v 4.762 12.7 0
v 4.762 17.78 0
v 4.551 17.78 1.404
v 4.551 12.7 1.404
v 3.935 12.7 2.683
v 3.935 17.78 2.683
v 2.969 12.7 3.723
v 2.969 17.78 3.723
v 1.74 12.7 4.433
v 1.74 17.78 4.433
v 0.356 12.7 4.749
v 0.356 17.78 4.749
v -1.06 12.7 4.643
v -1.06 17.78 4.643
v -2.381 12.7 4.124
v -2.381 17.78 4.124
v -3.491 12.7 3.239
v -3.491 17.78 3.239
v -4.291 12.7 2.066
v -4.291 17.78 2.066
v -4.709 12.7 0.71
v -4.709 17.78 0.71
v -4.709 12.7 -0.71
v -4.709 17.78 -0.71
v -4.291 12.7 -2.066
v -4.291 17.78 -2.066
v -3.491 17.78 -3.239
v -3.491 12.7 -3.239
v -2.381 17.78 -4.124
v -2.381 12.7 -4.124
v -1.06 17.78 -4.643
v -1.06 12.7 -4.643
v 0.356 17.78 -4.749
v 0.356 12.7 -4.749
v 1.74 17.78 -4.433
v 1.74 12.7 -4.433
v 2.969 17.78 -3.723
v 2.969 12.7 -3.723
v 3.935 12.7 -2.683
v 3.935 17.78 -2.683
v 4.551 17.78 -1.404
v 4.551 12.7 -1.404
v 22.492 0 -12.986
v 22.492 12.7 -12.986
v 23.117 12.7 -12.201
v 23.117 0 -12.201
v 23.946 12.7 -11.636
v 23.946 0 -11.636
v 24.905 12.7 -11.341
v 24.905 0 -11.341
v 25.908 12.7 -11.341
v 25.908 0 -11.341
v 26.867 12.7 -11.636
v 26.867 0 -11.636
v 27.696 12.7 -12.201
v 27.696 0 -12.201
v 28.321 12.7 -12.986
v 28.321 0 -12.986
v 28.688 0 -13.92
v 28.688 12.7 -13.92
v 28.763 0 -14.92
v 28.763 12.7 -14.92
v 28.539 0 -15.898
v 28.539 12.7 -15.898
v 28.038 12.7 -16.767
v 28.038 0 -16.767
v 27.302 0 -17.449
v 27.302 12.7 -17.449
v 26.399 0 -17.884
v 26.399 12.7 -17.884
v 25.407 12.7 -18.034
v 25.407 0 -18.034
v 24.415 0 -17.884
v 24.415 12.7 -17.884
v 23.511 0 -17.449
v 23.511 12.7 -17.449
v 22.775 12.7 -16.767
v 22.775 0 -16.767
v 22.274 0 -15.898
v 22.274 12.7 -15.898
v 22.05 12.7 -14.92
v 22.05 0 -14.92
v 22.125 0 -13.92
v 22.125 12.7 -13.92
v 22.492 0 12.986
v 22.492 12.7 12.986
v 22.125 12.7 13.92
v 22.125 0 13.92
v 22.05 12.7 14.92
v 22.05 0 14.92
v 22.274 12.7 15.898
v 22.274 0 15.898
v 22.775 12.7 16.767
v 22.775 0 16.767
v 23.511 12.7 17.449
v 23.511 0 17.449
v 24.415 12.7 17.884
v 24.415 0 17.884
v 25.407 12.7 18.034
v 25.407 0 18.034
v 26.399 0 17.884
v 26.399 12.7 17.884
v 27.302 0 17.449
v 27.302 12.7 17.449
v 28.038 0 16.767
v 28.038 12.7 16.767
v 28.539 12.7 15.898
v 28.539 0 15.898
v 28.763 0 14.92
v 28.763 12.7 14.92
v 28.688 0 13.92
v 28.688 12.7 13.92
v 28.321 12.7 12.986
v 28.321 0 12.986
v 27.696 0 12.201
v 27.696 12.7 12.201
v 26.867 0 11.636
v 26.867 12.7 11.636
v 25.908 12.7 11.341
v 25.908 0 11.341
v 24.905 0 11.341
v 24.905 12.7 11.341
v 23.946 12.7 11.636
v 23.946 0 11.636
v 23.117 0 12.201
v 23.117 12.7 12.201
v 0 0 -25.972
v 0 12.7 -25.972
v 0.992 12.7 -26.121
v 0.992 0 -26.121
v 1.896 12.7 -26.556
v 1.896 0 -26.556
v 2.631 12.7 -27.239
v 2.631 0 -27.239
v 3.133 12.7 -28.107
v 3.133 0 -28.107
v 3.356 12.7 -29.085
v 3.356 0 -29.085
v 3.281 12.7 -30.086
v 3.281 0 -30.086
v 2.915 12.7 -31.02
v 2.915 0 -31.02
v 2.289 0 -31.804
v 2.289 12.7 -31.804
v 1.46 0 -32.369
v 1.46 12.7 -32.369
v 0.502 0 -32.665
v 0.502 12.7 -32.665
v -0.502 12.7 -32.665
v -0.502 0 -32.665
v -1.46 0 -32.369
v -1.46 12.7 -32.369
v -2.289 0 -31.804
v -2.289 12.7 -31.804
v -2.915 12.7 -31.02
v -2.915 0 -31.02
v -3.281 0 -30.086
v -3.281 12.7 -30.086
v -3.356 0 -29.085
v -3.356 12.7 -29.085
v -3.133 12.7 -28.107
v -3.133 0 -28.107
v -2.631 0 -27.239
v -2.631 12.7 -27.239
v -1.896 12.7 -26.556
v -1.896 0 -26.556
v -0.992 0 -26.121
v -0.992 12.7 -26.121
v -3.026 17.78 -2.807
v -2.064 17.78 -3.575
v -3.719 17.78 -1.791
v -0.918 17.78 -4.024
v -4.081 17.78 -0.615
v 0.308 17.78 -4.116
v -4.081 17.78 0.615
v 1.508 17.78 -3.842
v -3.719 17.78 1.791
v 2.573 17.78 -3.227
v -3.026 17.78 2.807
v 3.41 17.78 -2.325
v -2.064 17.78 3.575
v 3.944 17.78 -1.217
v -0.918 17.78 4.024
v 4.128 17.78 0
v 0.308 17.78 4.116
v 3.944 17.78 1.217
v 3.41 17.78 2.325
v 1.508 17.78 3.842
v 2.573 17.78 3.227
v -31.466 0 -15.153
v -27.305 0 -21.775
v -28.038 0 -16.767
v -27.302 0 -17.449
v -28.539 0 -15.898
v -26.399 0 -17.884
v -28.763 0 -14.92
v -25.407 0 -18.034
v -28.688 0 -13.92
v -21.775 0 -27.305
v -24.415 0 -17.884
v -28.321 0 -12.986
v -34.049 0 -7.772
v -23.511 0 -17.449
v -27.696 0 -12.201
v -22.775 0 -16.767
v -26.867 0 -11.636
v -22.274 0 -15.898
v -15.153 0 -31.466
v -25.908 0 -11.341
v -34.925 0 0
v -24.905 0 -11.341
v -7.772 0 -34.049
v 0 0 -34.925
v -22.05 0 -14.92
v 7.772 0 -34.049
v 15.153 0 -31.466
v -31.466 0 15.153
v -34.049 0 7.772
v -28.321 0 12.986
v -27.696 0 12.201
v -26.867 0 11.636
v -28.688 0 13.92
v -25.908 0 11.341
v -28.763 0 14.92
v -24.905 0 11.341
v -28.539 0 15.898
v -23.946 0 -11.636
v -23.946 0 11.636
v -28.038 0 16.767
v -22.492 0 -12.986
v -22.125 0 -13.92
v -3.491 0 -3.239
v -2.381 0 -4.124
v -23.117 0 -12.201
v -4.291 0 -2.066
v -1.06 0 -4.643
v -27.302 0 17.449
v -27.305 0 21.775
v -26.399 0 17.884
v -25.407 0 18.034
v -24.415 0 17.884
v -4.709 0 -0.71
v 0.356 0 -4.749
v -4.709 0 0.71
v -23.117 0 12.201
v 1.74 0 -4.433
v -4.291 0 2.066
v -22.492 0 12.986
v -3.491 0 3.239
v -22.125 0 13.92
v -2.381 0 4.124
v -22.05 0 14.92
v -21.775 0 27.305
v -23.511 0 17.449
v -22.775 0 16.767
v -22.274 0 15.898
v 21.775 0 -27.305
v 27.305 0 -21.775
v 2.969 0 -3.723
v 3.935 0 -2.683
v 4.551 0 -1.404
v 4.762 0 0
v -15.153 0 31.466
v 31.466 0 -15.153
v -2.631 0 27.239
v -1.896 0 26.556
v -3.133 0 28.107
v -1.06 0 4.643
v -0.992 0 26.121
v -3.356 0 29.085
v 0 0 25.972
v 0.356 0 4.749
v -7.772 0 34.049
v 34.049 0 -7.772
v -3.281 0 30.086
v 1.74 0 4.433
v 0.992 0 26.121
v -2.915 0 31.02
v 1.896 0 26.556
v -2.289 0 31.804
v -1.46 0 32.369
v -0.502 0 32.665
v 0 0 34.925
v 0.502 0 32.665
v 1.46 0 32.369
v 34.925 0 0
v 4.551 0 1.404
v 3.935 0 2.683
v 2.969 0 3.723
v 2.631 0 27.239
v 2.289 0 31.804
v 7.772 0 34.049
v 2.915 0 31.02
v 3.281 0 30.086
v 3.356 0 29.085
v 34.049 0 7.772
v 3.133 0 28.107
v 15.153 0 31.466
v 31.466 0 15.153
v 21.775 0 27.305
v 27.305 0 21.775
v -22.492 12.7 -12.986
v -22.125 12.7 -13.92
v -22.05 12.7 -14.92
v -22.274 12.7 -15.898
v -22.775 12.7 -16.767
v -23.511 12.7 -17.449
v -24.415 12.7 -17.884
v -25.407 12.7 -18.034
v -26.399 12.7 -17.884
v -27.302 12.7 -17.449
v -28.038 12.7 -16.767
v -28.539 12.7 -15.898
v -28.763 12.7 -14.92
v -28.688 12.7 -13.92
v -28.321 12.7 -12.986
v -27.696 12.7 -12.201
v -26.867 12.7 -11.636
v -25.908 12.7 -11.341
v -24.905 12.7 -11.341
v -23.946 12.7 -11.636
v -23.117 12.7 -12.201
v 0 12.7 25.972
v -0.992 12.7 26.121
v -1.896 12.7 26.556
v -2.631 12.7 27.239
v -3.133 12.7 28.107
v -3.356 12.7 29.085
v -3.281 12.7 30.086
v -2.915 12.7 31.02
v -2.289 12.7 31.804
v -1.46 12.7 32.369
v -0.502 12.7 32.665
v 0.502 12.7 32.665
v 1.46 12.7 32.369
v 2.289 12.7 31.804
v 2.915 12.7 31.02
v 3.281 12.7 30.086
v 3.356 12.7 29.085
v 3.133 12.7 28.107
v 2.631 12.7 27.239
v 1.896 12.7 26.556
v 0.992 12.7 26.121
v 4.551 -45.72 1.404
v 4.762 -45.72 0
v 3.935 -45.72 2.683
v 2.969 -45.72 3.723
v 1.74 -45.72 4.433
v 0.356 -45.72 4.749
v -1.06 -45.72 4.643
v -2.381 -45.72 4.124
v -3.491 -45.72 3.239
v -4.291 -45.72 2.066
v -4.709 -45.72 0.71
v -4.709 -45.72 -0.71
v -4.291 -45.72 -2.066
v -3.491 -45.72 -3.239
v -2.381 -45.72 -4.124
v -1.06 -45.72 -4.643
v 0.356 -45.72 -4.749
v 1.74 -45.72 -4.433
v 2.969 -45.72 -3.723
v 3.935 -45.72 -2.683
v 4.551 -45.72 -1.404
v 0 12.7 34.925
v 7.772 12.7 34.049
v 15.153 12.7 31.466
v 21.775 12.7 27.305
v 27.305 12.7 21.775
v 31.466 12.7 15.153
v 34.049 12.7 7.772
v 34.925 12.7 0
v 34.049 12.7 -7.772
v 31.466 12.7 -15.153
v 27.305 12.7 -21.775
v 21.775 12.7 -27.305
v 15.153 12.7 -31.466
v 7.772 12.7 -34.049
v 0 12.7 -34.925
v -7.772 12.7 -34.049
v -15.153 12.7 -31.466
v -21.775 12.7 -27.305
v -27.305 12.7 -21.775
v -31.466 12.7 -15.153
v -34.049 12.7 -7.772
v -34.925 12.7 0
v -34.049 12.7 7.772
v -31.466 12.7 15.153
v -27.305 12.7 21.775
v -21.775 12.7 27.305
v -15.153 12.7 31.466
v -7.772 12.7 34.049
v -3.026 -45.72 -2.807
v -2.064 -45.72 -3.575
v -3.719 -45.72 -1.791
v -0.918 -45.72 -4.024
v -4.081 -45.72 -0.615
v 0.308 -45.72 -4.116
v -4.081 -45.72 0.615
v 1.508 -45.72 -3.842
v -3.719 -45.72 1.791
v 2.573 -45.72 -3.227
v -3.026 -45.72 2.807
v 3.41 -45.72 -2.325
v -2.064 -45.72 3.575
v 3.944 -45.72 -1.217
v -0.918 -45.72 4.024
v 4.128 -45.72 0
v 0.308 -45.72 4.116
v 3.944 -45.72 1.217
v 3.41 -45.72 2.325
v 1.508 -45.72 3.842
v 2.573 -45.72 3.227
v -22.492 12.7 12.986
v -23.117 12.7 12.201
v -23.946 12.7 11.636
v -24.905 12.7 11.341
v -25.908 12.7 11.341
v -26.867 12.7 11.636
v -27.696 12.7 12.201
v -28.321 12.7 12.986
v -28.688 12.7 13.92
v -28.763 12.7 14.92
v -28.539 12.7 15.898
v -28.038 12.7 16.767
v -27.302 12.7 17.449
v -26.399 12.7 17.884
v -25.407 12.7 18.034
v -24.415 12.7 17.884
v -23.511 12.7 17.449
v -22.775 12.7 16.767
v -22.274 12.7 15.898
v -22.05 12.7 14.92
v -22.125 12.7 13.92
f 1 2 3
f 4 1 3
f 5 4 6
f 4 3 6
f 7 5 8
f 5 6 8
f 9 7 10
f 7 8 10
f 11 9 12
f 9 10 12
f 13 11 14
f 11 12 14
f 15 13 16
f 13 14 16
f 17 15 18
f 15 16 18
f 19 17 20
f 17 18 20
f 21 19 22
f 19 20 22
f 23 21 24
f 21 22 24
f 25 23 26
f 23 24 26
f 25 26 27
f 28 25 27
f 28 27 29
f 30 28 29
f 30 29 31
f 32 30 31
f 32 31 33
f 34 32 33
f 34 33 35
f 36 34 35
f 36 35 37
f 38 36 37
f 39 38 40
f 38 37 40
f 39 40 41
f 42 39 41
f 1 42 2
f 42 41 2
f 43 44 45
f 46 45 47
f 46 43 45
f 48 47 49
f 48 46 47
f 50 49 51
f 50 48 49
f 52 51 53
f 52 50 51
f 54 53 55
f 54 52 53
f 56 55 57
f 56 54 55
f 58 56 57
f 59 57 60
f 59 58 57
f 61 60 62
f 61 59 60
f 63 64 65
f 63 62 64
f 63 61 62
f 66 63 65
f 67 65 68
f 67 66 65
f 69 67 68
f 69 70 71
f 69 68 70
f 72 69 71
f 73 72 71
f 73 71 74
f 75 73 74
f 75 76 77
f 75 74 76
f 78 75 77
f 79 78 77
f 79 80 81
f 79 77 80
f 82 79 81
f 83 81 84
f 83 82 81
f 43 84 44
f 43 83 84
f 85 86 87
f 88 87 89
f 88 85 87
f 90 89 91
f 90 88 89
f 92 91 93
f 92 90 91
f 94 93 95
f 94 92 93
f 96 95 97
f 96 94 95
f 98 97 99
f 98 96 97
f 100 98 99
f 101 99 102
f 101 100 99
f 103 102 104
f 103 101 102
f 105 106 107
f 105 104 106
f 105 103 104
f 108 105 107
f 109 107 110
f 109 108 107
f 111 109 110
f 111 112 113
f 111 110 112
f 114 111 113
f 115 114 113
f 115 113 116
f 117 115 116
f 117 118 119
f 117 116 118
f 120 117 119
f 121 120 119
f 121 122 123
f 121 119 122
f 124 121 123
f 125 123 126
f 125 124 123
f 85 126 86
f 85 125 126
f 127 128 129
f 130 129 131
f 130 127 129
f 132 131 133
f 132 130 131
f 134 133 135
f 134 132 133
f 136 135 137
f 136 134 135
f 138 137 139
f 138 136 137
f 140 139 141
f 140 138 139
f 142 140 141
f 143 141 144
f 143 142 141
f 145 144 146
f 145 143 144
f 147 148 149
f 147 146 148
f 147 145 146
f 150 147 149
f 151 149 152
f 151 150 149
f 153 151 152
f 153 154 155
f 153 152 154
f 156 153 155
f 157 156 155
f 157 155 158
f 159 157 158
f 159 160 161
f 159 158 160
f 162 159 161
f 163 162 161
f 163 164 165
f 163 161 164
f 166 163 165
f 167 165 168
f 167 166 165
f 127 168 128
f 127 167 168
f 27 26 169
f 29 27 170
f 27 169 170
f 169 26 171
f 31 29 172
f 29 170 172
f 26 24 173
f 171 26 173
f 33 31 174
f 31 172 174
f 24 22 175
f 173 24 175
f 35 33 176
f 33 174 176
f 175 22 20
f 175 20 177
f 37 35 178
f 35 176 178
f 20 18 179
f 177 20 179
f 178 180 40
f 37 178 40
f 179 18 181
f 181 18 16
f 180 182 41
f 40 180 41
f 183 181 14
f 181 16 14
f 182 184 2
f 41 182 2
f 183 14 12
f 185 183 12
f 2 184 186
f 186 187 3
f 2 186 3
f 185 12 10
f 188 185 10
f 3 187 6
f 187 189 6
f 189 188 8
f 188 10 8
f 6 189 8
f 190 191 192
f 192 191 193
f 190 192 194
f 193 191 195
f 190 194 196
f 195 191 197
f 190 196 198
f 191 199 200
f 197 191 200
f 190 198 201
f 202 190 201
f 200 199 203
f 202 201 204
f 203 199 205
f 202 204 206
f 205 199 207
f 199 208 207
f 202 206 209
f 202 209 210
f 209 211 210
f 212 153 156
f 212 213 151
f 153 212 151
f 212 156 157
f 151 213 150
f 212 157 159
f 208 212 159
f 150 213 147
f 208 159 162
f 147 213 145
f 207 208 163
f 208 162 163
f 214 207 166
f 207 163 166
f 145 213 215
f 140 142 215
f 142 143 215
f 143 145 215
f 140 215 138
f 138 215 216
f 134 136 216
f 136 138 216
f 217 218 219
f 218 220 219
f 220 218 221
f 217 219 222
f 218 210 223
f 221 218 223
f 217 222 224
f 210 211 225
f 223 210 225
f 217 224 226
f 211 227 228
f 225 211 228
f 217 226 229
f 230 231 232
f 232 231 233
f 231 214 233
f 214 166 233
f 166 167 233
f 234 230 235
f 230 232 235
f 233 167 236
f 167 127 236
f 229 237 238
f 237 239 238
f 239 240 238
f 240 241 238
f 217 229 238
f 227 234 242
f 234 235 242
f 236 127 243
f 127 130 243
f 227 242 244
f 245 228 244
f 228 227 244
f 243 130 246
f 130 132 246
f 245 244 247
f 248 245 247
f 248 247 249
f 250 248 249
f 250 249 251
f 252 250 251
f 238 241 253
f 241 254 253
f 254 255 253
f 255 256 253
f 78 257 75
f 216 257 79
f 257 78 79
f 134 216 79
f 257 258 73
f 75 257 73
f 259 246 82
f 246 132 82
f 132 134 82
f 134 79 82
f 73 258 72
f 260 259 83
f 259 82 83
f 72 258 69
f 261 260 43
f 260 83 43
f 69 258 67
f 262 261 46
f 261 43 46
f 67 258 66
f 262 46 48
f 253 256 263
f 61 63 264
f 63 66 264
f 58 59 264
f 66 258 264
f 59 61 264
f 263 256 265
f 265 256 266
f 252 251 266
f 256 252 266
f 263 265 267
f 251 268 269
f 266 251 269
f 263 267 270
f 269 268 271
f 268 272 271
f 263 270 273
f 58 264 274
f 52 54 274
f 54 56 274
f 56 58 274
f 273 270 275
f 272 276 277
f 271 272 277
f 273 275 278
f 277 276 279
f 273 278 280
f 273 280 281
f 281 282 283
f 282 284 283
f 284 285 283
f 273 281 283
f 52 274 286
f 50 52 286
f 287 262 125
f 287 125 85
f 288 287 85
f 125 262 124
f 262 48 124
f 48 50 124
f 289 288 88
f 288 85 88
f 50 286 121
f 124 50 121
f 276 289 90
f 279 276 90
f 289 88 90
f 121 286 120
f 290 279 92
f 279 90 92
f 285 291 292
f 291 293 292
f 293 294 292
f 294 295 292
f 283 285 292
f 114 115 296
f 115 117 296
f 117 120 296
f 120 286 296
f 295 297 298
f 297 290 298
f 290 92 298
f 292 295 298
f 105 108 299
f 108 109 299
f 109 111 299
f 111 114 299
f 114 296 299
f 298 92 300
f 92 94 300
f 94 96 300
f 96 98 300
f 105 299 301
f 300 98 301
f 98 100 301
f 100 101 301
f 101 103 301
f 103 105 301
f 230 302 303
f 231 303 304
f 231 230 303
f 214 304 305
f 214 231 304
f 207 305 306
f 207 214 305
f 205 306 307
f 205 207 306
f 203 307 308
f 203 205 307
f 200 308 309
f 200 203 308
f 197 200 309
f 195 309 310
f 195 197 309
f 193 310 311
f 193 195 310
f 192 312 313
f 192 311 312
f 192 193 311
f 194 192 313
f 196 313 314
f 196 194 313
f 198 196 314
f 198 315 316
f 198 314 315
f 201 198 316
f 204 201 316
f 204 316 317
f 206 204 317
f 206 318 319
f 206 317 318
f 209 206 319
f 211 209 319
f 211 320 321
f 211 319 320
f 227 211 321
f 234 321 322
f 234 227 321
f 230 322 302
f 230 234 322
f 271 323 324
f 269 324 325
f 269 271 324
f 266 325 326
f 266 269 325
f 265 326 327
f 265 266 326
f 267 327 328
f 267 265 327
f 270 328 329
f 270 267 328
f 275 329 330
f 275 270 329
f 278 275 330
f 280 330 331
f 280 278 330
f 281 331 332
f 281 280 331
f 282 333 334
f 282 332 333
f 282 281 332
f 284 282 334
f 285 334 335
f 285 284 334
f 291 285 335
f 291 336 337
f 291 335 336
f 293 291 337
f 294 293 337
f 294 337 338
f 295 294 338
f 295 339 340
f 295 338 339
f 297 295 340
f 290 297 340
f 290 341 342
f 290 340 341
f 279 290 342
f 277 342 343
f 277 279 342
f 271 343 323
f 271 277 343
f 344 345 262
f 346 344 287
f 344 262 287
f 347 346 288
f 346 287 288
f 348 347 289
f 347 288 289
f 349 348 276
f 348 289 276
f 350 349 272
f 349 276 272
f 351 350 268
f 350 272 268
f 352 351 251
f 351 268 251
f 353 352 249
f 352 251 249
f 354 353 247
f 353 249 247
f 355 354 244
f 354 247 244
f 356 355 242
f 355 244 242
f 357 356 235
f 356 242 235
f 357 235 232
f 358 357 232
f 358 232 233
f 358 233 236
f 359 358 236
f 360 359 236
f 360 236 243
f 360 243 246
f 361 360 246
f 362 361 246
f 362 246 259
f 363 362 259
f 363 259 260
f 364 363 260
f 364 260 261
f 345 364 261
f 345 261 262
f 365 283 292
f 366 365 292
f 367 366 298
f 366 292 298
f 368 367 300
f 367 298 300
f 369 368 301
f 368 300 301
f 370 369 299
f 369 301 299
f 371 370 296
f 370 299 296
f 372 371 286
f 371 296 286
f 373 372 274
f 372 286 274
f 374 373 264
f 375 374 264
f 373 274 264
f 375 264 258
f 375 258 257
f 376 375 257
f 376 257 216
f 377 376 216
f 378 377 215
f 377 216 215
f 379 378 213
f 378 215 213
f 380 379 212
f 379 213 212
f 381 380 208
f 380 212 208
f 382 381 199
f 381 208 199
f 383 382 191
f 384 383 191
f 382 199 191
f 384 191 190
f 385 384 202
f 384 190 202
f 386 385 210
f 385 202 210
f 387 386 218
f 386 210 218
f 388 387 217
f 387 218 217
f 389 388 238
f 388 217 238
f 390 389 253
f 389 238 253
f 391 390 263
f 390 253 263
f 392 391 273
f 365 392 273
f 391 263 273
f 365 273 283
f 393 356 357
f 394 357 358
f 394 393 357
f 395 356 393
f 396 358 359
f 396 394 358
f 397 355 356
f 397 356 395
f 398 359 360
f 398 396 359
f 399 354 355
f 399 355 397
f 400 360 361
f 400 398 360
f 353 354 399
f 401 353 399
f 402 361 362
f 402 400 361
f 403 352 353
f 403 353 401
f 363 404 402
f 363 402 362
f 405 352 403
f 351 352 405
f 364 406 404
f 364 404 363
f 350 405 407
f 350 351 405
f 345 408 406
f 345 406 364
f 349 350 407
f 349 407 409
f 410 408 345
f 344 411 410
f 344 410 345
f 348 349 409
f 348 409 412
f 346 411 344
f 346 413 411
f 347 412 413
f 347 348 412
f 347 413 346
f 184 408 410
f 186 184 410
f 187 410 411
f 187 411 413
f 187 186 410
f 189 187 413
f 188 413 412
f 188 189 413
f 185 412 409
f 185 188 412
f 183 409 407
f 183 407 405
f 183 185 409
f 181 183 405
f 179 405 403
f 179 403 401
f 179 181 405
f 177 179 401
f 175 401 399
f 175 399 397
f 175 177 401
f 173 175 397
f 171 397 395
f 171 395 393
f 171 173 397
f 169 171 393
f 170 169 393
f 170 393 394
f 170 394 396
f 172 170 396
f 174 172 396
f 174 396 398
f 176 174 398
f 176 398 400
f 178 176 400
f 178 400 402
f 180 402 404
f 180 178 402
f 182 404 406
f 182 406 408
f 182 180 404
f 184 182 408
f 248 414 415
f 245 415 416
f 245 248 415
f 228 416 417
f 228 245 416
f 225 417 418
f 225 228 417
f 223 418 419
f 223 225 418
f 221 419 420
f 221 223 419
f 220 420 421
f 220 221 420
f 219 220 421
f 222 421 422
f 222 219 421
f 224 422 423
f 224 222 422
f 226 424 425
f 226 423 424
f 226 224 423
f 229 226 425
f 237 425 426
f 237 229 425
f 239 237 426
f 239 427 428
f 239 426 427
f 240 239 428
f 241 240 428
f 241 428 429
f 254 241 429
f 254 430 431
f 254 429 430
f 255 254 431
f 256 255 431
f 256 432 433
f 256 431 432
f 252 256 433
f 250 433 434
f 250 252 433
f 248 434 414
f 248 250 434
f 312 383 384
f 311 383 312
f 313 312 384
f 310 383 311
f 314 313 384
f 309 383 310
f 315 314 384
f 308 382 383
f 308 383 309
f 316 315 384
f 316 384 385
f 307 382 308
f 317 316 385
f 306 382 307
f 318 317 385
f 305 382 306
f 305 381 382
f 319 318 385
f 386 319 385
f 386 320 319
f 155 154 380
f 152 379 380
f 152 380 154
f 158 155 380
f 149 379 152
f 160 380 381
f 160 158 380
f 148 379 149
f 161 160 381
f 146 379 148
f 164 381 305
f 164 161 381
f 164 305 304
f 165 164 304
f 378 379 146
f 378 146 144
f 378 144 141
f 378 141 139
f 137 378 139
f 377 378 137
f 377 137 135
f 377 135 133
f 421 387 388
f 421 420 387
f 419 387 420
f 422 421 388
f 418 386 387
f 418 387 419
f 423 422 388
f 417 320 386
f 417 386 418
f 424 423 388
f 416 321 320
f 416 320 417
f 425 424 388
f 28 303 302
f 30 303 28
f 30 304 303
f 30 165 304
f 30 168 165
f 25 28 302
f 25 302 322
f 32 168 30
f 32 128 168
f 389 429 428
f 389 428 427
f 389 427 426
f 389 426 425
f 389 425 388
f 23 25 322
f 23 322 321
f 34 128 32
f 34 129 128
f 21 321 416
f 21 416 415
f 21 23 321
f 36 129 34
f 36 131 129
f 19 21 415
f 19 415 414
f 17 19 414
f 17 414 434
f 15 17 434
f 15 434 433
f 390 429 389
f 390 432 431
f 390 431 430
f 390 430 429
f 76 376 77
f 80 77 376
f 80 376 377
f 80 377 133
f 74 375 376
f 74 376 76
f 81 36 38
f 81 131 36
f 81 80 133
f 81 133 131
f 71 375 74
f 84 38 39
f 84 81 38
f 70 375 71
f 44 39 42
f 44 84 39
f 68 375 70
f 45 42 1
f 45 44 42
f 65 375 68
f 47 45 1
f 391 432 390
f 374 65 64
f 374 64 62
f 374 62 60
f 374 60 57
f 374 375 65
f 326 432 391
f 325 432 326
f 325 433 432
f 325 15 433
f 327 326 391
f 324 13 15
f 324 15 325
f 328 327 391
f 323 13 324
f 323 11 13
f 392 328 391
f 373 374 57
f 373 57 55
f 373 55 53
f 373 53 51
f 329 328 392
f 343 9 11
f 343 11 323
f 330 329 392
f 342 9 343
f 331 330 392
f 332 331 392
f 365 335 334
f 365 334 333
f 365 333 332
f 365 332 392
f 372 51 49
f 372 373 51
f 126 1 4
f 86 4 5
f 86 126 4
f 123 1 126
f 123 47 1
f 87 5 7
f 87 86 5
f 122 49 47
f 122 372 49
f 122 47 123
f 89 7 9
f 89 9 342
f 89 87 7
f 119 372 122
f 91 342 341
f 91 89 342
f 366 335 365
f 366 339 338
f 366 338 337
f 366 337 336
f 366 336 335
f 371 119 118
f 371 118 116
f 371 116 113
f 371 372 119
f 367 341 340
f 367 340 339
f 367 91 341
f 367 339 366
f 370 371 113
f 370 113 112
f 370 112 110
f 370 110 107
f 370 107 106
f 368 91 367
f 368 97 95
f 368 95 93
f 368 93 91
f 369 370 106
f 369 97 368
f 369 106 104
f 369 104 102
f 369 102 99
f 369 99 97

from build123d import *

# Parameters (mm, degrees)
SKETCH1_R                = 34.925
EXTRUDE1_DEPTH           = 12.7
SKETCH2_R                = 4.7625
CUT_EXTRUDE1_DEPTH       = 51.998051433
SKETCH3_R                = 3.3655
CUT_EXTRUDE2_DEPTH       = 51.998051433
CIRPATTERN1_COUNT        = 6
EXTRUDE_THIN1_DEPTH      = 45.72
EXTRUDE_THIN1_DEPTH_BACK = 17.78
SKETCH5_R                = 4.7625
SKETCH5_R_2              = 4.1275


with BuildPart() as part:
    # Sketch1 → Extrude1 (new body)
    with BuildSketch(Plane(origin=(0, 0, 0), x_dir=(1, 0, 0), z_dir=(0, 1, 0))):
        Circle(SKETCH1_R)
    extrude(amount=EXTRUDE1_DEPTH)

    # Sketch2 → Cut-Extrude1 (cut, through all)
    with BuildSketch(Plane(origin=(0, 0, 0), x_dir=(1, 0, 0), z_dir=(0, 1, 0))):
        Circle(SKETCH2_R)
    extrude(amount=CUT_EXTRUDE1_DEPTH, mode=Mode.SUBTRACT)

    # Sketch3 → Cut-Extrude2 (cut, through all)
    with BuildSketch(Plane(origin=(0, 0, 0), x_dir=(1, 0, 0), z_dir=(0, 1, 0))):
        with Locations((0, 29.337)):
            Circle(SKETCH3_R)
    cut_extrude2 = extrude(amount=CUT_EXTRUDE2_DEPTH, mode=Mode.SUBTRACT)

    # CirPattern1: Cut-Extrude2 ×6 about axis
    cirpattern1_axis = Axis((0, 35.858162691, 0), (0, -1, 0))
    for i in range(1, CIRPATTERN1_COUNT):
        add(cut_extrude2.rotate(cirpattern1_axis, i * 360 / CIRPATTERN1_COUNT), mode=Mode.SUBTRACT)

    # Sketch5 → Extrude-Thin1 (add, two sides: drawn at the far end of the back side and taken through both)
    with BuildSketch(Plane.XZ.offset(-EXTRUDE_THIN1_DEPTH_BACK)):
        Circle(SKETCH5_R)
        Circle(SKETCH5_R_2, mode=Mode.SUBTRACT)
    extrude(amount=EXTRUDE_THIN1_DEPTH + EXTRUDE_THIN1_DEPTH_BACK)


solid = part.part
